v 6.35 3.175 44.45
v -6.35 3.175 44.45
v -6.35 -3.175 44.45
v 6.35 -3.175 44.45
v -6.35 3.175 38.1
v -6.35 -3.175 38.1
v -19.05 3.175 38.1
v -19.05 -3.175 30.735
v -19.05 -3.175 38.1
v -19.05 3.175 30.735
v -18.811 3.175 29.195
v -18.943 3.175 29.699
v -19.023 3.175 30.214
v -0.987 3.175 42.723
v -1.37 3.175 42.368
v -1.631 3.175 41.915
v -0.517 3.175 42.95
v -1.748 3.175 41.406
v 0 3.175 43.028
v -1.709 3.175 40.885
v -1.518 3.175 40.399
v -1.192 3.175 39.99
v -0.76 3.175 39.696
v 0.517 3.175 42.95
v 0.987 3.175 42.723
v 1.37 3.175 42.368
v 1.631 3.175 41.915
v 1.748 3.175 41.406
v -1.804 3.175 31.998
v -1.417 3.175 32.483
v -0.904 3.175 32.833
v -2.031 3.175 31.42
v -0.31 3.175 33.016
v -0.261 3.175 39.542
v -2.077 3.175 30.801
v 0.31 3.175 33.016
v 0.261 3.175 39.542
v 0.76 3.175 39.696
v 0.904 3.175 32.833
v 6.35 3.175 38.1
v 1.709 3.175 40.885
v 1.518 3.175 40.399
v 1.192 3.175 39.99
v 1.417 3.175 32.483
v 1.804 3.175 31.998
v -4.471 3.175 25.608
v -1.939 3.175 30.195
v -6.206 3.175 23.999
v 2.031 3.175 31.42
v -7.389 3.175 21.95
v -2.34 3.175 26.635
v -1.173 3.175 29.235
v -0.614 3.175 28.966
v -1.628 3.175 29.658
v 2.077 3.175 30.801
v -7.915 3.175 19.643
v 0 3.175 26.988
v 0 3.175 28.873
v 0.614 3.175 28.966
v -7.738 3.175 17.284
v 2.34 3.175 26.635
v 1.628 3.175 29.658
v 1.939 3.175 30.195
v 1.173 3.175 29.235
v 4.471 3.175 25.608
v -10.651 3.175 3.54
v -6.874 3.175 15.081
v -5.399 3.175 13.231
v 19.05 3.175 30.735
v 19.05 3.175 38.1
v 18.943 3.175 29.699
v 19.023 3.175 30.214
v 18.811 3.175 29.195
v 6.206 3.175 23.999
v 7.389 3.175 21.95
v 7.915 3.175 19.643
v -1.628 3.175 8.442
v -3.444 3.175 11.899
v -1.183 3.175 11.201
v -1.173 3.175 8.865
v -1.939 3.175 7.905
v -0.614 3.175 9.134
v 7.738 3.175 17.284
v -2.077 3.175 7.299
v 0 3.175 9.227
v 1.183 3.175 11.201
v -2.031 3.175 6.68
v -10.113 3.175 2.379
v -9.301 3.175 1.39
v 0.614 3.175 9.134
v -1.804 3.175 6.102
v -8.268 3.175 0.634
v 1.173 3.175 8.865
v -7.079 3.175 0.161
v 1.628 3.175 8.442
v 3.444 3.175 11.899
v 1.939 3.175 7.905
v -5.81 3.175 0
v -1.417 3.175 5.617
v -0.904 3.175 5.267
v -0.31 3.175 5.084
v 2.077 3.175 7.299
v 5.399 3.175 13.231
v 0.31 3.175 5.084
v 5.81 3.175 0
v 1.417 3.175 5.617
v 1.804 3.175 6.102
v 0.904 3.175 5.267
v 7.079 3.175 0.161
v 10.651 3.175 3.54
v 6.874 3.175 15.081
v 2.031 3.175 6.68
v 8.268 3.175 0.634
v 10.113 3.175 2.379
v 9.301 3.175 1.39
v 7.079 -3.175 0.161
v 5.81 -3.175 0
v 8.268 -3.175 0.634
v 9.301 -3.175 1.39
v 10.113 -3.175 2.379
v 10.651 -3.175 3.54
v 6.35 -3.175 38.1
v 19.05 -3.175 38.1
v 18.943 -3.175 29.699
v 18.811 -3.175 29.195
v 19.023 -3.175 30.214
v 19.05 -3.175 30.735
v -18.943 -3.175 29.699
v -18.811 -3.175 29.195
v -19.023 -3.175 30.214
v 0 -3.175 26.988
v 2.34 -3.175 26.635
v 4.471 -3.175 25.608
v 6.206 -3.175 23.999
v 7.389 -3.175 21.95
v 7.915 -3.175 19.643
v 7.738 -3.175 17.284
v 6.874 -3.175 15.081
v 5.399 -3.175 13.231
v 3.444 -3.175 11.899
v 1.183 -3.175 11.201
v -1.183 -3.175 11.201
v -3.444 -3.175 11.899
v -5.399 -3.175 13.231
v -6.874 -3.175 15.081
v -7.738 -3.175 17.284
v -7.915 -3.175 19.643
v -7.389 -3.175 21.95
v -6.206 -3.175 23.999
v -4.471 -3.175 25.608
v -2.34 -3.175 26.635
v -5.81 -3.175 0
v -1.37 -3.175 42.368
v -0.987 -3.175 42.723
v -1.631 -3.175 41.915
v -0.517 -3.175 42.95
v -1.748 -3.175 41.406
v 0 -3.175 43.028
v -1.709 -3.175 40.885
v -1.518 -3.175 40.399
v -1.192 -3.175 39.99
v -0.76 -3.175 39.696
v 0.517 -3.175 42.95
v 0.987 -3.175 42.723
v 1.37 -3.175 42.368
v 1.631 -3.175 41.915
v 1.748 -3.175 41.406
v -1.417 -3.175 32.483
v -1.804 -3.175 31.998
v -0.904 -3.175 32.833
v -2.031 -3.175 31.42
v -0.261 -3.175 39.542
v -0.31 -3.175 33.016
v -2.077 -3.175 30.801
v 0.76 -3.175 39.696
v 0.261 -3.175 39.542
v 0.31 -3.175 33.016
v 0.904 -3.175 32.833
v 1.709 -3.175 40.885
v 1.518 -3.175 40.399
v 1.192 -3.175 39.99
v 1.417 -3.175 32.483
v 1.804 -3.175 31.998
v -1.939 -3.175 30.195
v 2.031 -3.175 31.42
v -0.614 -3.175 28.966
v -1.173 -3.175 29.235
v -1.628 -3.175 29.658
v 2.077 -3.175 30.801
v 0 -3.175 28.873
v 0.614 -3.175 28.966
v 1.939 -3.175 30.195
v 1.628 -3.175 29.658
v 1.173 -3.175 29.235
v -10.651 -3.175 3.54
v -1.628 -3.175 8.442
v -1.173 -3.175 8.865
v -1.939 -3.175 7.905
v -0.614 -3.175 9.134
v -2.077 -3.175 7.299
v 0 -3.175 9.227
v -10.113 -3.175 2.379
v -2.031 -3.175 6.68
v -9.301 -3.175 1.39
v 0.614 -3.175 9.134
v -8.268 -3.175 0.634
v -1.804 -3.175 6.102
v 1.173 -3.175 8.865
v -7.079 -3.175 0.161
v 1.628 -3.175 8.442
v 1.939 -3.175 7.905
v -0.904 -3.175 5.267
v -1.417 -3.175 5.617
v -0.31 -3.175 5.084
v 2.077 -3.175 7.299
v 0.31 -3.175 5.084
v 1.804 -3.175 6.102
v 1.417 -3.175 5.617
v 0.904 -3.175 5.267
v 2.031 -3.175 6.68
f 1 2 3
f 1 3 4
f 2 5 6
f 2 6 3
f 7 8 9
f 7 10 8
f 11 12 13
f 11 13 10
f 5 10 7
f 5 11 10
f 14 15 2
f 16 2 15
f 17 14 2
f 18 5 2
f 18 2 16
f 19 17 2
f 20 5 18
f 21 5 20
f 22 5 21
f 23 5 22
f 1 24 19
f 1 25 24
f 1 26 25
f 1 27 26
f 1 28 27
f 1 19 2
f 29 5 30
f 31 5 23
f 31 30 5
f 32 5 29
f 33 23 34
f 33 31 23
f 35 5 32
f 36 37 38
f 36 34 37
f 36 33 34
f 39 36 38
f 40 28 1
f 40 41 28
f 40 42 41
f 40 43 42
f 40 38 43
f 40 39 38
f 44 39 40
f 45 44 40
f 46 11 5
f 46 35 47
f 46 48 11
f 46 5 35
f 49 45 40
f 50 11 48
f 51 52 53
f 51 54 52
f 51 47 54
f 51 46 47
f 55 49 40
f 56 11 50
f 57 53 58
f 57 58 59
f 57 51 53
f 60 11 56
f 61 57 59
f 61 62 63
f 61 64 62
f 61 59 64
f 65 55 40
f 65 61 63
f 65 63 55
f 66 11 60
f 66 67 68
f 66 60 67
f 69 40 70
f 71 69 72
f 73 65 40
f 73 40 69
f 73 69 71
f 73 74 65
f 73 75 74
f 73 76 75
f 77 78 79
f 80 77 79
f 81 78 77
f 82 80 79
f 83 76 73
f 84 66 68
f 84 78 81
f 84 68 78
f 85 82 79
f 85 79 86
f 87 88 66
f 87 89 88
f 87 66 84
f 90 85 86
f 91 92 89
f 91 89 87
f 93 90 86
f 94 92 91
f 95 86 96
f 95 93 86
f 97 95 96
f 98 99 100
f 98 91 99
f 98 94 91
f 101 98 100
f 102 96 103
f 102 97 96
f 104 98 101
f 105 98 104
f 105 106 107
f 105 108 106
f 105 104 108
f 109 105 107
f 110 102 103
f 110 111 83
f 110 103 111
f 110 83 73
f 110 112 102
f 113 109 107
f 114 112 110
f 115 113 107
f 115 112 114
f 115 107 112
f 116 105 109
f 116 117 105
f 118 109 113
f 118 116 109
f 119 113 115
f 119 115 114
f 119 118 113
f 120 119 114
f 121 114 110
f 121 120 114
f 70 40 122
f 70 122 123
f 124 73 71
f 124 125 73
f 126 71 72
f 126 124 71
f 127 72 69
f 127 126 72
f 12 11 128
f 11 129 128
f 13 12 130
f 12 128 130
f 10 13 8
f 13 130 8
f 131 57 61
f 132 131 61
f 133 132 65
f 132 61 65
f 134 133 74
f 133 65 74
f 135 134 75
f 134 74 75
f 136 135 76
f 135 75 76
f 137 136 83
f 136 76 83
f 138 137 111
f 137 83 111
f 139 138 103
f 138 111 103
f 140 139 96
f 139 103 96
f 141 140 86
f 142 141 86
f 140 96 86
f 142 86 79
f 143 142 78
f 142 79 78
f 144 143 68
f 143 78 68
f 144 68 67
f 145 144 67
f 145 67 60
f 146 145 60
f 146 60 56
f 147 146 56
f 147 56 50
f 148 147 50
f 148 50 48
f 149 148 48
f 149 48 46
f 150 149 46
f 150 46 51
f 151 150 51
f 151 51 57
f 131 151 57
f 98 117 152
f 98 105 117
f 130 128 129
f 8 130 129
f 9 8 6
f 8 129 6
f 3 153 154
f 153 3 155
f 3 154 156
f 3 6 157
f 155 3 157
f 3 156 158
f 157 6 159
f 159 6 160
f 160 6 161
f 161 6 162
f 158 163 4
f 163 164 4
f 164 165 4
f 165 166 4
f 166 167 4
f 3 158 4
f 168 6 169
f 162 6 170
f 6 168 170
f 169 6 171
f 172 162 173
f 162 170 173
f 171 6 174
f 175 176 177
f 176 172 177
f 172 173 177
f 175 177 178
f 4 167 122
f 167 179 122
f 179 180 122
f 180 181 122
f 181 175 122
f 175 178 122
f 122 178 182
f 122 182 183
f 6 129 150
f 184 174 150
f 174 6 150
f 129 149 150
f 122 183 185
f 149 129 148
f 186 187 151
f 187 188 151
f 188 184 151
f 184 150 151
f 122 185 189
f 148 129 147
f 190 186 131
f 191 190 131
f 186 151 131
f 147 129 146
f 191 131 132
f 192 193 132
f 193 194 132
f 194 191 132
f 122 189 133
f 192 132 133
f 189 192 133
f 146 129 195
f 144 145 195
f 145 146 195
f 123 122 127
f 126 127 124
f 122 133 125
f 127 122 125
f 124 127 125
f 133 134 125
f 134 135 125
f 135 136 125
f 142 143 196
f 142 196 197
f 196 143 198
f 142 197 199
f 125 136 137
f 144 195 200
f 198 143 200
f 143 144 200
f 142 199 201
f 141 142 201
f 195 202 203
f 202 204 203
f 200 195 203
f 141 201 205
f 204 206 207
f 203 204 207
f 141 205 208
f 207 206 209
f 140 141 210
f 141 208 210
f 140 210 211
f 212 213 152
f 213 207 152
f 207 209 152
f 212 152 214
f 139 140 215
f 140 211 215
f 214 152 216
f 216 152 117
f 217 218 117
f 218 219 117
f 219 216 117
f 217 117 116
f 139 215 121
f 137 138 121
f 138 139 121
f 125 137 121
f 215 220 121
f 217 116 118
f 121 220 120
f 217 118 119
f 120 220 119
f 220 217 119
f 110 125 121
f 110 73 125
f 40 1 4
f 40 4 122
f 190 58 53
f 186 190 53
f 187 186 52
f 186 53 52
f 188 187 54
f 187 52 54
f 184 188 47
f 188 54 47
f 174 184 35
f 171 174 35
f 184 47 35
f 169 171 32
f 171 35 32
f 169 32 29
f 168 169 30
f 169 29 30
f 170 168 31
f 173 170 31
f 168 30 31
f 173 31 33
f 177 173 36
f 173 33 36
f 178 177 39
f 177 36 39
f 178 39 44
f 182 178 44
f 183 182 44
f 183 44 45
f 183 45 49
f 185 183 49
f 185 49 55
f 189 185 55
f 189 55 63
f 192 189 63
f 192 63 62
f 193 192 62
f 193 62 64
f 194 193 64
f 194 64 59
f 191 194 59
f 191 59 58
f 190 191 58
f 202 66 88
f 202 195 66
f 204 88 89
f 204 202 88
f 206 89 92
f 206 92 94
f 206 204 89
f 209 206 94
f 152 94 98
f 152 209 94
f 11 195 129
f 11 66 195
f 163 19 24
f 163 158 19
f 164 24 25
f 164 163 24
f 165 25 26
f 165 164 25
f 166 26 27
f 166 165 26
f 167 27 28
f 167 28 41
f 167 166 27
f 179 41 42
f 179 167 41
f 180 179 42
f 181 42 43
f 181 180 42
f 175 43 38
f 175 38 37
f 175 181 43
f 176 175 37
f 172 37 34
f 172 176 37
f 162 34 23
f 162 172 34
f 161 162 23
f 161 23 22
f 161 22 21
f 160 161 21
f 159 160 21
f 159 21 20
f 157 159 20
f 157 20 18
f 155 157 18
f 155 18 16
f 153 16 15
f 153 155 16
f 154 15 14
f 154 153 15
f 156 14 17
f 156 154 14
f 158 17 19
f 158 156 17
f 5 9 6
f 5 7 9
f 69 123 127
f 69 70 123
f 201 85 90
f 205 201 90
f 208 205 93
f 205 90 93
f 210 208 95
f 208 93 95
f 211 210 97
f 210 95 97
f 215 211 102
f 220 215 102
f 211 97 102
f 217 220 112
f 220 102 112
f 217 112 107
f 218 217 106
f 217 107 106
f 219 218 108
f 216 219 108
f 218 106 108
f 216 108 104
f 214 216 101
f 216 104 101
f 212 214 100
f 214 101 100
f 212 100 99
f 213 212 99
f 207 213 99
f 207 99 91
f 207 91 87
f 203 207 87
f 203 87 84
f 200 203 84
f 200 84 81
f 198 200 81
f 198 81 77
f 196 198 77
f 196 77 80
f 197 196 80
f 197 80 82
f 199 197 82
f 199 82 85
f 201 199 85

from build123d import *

# Parameters (mm, degrees)
SKETCH1_R           = 1.7526
BOSS_EXTRUDE1_DEPTH = 3.175
FILLET1_R           = 5.08
FILLET2_R           = 5.08
SKETCH2_R           = 2.0828
SKETCH2_R_2         = 7.9375
CUT_EXTRUDE1_DEPTH  = 49.775275499


with BuildPart() as part:
    # Sketch1 → Boss-Extrude1 (new, symmetric)
    with BuildSketch(Plane(origin=(0, 0, 0), x_dir=(1, 0, 0), z_dir=(0, 1, 0))):
        Polygon((-19.05, -38.1), (-6.35, -38.1), (-6.35, -44.45), (6.35, -44.45), (6.35, -38.1), (19.05, -38.1), (19.05, -29.9466), (9.525, 0), (-9.525, 0), (-19.05, -29.9466), align=None)
        with Locations(Location((0, -41.275, 0), (0, 0, 270))):
            Circle(SKETCH1_R, mode=Mode.SUBTRACT)
    extrude(amount=BOSS_EXTRUDE1_DEPTH, both=True)

    # Fillet1
    fillet1_edges = [part.edges().sort_by_distance(p)[0] for p in [
        (-9.525, 0, 0),
        (9.525, 0, 0),
    ]]
    fillet(fillet1_edges, radius=FILLET1_R)

    # Fillet2
    fillet2_edges = [part.edges().sort_by_distance(p)[0] for p in [
        (-19.05, 0, 29.9466),
        (19.05, 0, 29.9466),
    ]]
    fillet(fillet2_edges, radius=FILLET2_R)

    # Sketch2 → Cut-Extrude1 (cut, through all)
    with BuildSketch(Plane(origin=(0, 3.175, 0), x_dir=(1, 0, 0), z_dir=(0, 1, 0))):
        with Locations(Location((0, -7.14375, 0), (0, 0, 270))):
            Circle(SKETCH2_R)
        with Locations(Location((0, -19.05, 0), (0, 0, 270))):
            Circle(SKETCH2_R_2)
        with Locations(Location((0, -30.95625, 0), (0, 0, 90))):
            Circle(SKETCH2_R)
    extrude(amount=-CUT_EXTRUDE1_DEPTH, mode=Mode.SUBTRACT)


solid = part.part
